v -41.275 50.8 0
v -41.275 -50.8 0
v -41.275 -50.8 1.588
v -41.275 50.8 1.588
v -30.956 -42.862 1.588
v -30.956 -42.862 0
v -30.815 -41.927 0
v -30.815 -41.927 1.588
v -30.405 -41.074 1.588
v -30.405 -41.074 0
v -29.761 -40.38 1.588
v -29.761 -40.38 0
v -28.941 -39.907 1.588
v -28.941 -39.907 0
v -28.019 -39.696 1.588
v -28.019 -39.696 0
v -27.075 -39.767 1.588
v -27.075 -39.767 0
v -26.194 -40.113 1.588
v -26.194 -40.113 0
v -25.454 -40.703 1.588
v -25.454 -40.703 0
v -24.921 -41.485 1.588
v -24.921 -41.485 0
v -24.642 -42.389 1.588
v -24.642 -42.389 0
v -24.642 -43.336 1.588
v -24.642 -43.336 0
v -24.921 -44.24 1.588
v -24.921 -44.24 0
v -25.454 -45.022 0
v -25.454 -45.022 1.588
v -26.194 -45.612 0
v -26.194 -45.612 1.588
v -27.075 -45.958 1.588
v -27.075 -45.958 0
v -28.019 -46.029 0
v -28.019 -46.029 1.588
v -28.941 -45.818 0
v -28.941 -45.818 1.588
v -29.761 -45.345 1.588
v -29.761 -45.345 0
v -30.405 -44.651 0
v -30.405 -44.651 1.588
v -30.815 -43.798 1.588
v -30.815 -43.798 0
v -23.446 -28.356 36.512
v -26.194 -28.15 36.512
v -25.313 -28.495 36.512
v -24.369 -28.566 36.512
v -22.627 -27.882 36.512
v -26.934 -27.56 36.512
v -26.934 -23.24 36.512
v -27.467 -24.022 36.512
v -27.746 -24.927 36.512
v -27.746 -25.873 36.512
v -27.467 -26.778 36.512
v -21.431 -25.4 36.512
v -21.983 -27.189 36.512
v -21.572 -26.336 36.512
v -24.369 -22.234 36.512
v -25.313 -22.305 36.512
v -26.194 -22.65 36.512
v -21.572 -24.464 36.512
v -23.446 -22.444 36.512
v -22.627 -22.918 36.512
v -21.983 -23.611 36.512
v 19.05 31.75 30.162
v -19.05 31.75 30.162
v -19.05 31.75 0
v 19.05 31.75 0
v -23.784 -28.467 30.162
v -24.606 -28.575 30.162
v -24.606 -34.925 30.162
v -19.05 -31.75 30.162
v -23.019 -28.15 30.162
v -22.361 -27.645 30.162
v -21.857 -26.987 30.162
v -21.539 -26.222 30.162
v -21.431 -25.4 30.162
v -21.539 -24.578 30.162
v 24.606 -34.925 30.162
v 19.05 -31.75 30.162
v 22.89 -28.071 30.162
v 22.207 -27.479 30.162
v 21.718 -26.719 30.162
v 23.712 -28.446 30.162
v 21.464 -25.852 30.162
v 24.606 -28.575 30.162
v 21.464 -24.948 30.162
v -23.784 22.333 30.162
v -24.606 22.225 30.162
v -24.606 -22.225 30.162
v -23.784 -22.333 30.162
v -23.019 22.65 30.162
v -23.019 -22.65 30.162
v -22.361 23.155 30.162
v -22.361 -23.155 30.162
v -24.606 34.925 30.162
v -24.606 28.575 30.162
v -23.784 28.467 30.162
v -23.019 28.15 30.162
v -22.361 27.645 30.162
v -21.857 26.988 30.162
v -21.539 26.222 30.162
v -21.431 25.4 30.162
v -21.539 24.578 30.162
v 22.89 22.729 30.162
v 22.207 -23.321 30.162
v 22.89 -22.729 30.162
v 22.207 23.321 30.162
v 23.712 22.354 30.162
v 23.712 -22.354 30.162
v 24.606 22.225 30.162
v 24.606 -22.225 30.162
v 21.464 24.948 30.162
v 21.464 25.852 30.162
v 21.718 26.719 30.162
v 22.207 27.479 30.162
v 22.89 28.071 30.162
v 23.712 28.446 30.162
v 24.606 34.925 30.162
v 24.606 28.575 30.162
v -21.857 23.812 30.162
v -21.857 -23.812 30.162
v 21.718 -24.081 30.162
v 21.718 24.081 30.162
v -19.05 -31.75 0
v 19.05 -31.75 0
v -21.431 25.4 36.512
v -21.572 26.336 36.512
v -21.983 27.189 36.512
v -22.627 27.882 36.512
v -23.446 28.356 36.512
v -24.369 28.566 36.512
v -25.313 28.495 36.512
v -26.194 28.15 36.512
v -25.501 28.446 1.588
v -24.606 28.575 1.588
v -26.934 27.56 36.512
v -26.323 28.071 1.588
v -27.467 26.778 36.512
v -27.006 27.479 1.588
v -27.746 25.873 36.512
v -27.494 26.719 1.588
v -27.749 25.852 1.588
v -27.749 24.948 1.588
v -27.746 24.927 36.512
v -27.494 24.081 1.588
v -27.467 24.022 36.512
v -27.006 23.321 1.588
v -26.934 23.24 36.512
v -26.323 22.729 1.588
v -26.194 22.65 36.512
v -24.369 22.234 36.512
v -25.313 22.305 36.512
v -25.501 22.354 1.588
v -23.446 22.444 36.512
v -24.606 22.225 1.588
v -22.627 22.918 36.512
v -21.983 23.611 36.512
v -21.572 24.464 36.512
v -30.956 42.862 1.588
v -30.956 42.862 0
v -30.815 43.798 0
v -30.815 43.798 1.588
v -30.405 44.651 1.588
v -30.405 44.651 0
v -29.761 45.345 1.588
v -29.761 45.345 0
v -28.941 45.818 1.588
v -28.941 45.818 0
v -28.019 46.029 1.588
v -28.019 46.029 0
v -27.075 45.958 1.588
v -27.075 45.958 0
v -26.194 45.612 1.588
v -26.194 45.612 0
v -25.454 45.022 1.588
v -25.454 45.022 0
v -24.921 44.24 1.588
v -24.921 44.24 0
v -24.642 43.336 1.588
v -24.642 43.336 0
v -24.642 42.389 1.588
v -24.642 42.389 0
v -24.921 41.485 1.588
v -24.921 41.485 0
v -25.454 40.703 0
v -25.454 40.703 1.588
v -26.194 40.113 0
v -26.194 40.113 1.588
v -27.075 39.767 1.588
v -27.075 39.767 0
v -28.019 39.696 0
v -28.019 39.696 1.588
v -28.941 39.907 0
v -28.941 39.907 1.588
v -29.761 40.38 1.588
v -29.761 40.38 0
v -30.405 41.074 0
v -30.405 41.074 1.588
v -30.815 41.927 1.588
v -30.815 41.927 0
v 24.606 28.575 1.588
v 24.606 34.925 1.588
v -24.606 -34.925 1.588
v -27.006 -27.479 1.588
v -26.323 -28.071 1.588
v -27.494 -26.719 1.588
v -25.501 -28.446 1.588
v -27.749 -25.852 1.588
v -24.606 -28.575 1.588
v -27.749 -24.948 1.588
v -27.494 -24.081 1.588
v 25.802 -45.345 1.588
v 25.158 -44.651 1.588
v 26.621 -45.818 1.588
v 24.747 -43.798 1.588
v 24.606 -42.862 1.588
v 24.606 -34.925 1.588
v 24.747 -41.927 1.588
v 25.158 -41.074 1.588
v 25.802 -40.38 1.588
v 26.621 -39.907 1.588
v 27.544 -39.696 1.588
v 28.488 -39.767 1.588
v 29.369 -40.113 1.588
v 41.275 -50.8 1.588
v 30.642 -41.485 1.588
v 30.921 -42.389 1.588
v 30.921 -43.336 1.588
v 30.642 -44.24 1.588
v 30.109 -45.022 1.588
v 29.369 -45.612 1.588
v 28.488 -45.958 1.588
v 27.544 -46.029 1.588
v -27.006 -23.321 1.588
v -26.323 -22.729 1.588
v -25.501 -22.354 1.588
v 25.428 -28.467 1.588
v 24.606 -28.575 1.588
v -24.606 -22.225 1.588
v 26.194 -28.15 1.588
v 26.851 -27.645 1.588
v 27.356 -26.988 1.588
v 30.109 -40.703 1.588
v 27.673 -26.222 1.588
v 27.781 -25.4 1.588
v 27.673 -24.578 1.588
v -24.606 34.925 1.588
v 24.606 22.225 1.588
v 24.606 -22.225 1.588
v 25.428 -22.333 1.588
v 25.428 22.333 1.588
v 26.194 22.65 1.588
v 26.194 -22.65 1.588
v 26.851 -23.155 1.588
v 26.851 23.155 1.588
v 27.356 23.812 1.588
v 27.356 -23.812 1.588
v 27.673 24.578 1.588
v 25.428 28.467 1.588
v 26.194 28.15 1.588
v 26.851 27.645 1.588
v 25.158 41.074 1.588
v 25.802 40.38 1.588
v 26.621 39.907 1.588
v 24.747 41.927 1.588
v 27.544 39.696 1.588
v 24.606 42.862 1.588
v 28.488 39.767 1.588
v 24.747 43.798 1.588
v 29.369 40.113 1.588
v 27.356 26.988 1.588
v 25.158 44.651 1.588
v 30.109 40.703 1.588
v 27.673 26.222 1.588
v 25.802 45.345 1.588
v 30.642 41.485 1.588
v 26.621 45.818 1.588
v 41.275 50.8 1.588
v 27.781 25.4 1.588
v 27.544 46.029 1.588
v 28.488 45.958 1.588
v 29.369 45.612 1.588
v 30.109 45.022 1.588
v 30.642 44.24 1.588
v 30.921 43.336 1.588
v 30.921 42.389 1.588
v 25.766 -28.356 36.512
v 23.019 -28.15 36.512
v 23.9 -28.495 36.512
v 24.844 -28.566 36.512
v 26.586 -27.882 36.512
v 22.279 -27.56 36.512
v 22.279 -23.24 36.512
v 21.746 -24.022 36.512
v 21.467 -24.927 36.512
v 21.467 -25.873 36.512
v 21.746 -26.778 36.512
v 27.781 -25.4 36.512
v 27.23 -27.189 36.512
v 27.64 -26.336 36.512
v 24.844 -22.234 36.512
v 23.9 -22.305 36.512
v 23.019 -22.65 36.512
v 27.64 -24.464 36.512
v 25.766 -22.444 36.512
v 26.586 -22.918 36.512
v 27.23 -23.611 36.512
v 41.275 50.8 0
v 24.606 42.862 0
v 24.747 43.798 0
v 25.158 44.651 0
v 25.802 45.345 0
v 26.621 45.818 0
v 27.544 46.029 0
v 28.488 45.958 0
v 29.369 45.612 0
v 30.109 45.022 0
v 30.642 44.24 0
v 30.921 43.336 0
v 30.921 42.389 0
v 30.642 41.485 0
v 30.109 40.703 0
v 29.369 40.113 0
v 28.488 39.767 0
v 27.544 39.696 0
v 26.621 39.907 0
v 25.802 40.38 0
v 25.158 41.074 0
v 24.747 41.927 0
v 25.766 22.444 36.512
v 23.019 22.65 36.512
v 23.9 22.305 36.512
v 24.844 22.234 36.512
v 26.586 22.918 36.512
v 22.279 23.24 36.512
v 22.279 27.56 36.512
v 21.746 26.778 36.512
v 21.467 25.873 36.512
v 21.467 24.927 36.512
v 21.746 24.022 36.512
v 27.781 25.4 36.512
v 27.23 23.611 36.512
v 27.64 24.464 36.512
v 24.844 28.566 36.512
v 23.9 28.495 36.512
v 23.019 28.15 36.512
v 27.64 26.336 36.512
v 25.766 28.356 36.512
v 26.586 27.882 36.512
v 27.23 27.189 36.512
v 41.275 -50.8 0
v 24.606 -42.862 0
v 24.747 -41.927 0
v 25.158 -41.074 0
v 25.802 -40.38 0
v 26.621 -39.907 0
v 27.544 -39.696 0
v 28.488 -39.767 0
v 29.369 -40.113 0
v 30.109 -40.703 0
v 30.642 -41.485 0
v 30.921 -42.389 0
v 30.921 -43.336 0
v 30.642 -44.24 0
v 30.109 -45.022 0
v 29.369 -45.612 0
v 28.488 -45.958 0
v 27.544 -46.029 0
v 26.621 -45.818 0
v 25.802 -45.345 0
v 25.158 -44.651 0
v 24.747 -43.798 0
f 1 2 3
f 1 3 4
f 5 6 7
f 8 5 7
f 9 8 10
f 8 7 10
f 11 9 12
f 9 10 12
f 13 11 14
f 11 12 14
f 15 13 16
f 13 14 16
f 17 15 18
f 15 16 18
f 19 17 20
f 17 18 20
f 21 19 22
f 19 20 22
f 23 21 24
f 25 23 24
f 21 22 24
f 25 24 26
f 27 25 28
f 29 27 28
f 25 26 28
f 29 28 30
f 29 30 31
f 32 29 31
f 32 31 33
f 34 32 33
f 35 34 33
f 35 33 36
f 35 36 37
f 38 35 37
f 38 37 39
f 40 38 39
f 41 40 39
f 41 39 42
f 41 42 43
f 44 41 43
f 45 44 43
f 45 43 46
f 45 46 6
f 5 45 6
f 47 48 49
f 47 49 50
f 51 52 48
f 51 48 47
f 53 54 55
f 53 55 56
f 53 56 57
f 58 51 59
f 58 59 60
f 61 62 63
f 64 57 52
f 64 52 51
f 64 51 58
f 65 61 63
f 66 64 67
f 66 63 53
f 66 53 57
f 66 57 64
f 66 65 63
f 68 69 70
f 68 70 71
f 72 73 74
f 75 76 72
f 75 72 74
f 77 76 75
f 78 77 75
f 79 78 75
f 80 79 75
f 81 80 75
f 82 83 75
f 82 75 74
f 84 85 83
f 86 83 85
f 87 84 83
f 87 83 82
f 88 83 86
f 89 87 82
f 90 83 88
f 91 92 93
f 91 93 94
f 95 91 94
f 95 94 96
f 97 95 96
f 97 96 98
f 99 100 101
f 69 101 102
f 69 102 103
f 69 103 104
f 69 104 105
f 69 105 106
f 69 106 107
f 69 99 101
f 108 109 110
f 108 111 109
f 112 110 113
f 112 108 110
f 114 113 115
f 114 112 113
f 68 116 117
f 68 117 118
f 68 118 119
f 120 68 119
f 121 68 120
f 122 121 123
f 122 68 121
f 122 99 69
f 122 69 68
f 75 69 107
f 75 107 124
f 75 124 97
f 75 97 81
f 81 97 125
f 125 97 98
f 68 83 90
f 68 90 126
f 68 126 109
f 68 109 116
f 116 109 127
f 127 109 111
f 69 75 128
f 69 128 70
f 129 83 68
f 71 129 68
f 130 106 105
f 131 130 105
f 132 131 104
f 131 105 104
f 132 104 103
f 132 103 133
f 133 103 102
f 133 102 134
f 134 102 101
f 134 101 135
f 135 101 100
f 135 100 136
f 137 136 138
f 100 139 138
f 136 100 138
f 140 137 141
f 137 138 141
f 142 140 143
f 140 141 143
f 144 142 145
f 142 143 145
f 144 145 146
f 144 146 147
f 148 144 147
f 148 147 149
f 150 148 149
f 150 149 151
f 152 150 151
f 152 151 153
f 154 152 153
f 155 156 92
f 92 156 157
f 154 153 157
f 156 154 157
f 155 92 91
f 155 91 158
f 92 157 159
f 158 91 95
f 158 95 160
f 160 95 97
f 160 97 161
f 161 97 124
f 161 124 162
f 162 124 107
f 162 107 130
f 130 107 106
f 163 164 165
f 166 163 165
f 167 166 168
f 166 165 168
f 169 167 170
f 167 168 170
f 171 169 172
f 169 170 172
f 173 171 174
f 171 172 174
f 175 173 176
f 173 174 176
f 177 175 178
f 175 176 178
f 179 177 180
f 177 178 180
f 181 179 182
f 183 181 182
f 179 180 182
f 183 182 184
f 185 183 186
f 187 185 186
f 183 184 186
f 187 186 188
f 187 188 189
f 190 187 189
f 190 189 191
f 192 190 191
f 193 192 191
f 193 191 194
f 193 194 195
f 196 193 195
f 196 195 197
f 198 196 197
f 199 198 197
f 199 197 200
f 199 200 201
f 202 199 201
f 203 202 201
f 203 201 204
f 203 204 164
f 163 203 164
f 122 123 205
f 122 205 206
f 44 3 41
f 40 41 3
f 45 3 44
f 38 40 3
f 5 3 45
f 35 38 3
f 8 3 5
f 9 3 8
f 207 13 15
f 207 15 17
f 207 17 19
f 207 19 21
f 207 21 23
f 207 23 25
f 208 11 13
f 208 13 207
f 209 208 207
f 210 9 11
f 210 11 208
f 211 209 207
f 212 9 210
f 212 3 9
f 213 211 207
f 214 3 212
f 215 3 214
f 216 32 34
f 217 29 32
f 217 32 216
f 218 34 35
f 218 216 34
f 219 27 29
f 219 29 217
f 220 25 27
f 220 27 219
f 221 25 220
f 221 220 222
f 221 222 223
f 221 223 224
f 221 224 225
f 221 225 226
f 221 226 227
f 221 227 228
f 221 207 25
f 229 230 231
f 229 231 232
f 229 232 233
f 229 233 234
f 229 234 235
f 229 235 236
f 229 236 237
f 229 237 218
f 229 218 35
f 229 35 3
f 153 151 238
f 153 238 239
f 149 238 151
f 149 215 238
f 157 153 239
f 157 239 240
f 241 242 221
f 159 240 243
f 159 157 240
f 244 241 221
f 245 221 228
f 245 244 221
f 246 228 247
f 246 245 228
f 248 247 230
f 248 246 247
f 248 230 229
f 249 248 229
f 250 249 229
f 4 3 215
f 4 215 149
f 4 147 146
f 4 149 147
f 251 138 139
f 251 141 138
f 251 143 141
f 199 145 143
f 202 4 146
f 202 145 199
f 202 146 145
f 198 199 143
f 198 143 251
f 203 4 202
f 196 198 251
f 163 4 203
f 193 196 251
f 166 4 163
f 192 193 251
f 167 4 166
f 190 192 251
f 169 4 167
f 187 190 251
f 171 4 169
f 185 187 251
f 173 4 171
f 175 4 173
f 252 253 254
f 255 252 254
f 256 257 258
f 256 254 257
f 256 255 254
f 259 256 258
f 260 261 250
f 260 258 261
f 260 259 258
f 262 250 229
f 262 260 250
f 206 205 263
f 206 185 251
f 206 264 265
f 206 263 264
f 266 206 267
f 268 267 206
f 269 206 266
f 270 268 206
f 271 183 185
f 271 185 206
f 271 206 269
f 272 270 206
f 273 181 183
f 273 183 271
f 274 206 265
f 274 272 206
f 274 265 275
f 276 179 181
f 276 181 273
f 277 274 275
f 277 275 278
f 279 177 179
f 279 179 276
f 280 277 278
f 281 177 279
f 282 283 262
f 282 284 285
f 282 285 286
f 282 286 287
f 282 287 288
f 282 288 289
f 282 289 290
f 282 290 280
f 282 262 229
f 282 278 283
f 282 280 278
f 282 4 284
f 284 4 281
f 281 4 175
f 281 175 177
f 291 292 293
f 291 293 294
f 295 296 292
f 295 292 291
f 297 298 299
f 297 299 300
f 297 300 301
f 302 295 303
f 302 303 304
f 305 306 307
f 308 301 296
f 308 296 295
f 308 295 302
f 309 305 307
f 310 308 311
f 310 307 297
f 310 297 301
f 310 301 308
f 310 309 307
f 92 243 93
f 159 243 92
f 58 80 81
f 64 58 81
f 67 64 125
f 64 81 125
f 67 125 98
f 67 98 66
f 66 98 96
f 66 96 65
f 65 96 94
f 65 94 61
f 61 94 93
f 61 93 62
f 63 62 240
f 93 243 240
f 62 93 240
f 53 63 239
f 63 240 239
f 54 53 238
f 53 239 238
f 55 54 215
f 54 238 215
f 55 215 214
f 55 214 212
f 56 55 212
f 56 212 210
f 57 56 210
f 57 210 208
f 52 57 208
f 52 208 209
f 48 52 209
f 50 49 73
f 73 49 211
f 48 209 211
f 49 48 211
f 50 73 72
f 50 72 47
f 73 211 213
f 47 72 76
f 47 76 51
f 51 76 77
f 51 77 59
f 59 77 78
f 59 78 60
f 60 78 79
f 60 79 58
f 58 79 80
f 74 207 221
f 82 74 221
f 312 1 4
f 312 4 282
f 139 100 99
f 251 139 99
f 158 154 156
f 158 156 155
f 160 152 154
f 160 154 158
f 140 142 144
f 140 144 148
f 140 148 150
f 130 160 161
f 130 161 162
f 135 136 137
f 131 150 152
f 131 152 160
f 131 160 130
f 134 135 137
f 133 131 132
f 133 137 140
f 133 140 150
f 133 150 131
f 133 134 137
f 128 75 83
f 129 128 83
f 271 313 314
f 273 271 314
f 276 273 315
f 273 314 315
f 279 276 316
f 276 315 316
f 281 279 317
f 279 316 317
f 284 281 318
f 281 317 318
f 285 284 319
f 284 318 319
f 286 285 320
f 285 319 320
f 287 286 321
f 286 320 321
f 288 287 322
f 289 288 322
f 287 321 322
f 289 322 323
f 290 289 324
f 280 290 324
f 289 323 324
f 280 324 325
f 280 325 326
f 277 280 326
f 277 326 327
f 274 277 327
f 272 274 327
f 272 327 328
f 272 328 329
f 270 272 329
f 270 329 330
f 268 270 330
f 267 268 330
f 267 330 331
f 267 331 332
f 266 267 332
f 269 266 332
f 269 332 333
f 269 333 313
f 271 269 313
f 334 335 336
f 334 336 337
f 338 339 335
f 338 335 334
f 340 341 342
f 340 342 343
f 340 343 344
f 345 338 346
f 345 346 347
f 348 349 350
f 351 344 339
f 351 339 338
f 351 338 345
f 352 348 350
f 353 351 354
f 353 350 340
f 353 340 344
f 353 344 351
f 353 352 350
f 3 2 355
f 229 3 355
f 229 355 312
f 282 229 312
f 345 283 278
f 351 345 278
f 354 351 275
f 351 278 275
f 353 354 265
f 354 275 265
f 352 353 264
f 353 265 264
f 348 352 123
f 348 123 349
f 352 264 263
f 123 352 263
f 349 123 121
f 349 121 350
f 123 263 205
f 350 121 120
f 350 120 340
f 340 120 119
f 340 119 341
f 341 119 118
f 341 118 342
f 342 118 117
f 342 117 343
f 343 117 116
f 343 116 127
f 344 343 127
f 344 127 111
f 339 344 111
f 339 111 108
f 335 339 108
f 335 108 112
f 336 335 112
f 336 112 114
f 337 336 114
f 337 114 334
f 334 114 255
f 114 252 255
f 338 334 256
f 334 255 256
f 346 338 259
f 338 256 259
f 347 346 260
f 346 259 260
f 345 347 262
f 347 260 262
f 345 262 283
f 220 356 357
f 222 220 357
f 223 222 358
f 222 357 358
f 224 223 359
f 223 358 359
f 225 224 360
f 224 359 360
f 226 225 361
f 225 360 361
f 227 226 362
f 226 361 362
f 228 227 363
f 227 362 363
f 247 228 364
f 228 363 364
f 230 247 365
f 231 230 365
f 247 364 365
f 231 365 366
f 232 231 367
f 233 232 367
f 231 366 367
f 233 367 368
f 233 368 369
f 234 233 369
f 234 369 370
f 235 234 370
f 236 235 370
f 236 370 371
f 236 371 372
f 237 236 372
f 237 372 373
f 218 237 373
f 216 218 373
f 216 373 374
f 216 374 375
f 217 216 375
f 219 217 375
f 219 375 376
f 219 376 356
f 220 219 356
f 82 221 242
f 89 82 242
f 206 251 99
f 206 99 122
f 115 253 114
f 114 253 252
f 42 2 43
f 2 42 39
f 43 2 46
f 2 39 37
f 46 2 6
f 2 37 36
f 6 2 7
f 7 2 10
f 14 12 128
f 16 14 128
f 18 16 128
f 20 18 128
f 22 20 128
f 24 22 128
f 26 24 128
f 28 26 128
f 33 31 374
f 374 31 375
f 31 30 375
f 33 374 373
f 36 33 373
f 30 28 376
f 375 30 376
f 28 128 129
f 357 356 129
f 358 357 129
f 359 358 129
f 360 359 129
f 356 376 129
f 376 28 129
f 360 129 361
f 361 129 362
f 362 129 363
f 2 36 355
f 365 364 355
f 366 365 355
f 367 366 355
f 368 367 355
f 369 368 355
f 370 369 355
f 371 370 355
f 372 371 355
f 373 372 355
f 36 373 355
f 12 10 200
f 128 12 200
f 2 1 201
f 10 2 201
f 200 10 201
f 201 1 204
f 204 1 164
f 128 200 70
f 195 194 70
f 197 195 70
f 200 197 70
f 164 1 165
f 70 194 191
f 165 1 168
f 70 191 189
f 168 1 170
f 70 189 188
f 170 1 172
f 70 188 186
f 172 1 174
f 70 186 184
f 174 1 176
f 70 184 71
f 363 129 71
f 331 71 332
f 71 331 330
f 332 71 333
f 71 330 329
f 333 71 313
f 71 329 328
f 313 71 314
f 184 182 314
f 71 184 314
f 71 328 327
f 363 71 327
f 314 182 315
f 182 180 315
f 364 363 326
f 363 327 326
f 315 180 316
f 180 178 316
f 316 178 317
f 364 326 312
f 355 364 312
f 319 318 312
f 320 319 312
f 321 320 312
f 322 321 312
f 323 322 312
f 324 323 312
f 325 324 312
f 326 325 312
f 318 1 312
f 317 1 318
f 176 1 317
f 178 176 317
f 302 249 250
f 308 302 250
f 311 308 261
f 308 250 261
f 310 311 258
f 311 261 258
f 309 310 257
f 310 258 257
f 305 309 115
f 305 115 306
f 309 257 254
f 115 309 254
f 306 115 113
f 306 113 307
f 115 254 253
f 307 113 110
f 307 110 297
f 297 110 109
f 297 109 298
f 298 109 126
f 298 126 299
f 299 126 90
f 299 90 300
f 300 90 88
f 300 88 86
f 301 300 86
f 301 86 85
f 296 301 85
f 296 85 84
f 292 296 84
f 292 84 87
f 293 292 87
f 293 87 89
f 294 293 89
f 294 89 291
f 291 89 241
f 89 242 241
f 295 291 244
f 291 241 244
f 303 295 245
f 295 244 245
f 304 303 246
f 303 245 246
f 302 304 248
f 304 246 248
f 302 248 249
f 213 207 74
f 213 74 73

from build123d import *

# Parameters (mm, degrees)
SKETCH1_W                   = 82.55
SKETCH1_H                   = 101.6
BOSS_EXTRUDE1_DEPTH         = 1.5875
SKETCH2_W                   = 49.2125
SKETCH2_H                   = 69.85
BOSS_EXTRUDE2_DEPTH         = 28.575
SKETCH3_R                   = 3.175
BOSS_EXTRUDE3_DEPTH         = 34.925
F_1_4_0_25_DIAMETER_HOLE1_D = 6.35
SKETCH6_W                   = 38.1
SKETCH6_H                   = 63.5
CUT_EXTRUDE1_DEPTH          = 31.1625


with BuildPart() as part:
    # Sketch1 → Boss-Extrude1 (new body)
    with BuildSketch(Plane.XY):
        Rectangle(SKETCH1_W, SKETCH1_H)
    extrude(amount=BOSS_EXTRUDE1_DEPTH)

    # Sketch2 → Boss-Extrude2 (add)
    with BuildSketch(Plane.XY.offset(1.5875)):
        Rectangle(SKETCH2_W, SKETCH2_H)
    extrude(amount=BOSS_EXTRUDE2_DEPTH)

    # Sketch3 → Boss-Extrude3 (add)
    with BuildSketch(Plane.XY.offset(1.5875)):
        with Locations((-24.60625, 25.4)):
            Circle(SKETCH3_R)
        with Locations((24.60625, 25.4)):
            Circle(SKETCH3_R)
        with Locations((-24.60625, -25.4)):
            Circle(SKETCH3_R)
        with Locations((24.60625, -25.4)):
            Circle(SKETCH3_R)
    extrude(amount=BOSS_EXTRUDE3_DEPTH)

    # 1/4 (0.25) Diameter Hole1 (through all)
    with Locations(Plane.XY.offset(1.5875)):
        with Locations((-27.78125, 42.8625), (27.78125, 42.8625), (-27.78125, -42.8625), (27.78125, -42.8625)):
            Hole(F_1_4_0_25_DIAMETER_HOLE1_D / 2)

    # Sketch6 → Cut-Extrude1 (cut, through all)
    with BuildSketch(Plane.XY.offset(30.1625)):
        Rectangle(SKETCH6_W, SKETCH6_H)
    extrude(amount=-CUT_EXTRUDE1_DEPTH, mode=Mode.SUBTRACT)


solid = part.part
